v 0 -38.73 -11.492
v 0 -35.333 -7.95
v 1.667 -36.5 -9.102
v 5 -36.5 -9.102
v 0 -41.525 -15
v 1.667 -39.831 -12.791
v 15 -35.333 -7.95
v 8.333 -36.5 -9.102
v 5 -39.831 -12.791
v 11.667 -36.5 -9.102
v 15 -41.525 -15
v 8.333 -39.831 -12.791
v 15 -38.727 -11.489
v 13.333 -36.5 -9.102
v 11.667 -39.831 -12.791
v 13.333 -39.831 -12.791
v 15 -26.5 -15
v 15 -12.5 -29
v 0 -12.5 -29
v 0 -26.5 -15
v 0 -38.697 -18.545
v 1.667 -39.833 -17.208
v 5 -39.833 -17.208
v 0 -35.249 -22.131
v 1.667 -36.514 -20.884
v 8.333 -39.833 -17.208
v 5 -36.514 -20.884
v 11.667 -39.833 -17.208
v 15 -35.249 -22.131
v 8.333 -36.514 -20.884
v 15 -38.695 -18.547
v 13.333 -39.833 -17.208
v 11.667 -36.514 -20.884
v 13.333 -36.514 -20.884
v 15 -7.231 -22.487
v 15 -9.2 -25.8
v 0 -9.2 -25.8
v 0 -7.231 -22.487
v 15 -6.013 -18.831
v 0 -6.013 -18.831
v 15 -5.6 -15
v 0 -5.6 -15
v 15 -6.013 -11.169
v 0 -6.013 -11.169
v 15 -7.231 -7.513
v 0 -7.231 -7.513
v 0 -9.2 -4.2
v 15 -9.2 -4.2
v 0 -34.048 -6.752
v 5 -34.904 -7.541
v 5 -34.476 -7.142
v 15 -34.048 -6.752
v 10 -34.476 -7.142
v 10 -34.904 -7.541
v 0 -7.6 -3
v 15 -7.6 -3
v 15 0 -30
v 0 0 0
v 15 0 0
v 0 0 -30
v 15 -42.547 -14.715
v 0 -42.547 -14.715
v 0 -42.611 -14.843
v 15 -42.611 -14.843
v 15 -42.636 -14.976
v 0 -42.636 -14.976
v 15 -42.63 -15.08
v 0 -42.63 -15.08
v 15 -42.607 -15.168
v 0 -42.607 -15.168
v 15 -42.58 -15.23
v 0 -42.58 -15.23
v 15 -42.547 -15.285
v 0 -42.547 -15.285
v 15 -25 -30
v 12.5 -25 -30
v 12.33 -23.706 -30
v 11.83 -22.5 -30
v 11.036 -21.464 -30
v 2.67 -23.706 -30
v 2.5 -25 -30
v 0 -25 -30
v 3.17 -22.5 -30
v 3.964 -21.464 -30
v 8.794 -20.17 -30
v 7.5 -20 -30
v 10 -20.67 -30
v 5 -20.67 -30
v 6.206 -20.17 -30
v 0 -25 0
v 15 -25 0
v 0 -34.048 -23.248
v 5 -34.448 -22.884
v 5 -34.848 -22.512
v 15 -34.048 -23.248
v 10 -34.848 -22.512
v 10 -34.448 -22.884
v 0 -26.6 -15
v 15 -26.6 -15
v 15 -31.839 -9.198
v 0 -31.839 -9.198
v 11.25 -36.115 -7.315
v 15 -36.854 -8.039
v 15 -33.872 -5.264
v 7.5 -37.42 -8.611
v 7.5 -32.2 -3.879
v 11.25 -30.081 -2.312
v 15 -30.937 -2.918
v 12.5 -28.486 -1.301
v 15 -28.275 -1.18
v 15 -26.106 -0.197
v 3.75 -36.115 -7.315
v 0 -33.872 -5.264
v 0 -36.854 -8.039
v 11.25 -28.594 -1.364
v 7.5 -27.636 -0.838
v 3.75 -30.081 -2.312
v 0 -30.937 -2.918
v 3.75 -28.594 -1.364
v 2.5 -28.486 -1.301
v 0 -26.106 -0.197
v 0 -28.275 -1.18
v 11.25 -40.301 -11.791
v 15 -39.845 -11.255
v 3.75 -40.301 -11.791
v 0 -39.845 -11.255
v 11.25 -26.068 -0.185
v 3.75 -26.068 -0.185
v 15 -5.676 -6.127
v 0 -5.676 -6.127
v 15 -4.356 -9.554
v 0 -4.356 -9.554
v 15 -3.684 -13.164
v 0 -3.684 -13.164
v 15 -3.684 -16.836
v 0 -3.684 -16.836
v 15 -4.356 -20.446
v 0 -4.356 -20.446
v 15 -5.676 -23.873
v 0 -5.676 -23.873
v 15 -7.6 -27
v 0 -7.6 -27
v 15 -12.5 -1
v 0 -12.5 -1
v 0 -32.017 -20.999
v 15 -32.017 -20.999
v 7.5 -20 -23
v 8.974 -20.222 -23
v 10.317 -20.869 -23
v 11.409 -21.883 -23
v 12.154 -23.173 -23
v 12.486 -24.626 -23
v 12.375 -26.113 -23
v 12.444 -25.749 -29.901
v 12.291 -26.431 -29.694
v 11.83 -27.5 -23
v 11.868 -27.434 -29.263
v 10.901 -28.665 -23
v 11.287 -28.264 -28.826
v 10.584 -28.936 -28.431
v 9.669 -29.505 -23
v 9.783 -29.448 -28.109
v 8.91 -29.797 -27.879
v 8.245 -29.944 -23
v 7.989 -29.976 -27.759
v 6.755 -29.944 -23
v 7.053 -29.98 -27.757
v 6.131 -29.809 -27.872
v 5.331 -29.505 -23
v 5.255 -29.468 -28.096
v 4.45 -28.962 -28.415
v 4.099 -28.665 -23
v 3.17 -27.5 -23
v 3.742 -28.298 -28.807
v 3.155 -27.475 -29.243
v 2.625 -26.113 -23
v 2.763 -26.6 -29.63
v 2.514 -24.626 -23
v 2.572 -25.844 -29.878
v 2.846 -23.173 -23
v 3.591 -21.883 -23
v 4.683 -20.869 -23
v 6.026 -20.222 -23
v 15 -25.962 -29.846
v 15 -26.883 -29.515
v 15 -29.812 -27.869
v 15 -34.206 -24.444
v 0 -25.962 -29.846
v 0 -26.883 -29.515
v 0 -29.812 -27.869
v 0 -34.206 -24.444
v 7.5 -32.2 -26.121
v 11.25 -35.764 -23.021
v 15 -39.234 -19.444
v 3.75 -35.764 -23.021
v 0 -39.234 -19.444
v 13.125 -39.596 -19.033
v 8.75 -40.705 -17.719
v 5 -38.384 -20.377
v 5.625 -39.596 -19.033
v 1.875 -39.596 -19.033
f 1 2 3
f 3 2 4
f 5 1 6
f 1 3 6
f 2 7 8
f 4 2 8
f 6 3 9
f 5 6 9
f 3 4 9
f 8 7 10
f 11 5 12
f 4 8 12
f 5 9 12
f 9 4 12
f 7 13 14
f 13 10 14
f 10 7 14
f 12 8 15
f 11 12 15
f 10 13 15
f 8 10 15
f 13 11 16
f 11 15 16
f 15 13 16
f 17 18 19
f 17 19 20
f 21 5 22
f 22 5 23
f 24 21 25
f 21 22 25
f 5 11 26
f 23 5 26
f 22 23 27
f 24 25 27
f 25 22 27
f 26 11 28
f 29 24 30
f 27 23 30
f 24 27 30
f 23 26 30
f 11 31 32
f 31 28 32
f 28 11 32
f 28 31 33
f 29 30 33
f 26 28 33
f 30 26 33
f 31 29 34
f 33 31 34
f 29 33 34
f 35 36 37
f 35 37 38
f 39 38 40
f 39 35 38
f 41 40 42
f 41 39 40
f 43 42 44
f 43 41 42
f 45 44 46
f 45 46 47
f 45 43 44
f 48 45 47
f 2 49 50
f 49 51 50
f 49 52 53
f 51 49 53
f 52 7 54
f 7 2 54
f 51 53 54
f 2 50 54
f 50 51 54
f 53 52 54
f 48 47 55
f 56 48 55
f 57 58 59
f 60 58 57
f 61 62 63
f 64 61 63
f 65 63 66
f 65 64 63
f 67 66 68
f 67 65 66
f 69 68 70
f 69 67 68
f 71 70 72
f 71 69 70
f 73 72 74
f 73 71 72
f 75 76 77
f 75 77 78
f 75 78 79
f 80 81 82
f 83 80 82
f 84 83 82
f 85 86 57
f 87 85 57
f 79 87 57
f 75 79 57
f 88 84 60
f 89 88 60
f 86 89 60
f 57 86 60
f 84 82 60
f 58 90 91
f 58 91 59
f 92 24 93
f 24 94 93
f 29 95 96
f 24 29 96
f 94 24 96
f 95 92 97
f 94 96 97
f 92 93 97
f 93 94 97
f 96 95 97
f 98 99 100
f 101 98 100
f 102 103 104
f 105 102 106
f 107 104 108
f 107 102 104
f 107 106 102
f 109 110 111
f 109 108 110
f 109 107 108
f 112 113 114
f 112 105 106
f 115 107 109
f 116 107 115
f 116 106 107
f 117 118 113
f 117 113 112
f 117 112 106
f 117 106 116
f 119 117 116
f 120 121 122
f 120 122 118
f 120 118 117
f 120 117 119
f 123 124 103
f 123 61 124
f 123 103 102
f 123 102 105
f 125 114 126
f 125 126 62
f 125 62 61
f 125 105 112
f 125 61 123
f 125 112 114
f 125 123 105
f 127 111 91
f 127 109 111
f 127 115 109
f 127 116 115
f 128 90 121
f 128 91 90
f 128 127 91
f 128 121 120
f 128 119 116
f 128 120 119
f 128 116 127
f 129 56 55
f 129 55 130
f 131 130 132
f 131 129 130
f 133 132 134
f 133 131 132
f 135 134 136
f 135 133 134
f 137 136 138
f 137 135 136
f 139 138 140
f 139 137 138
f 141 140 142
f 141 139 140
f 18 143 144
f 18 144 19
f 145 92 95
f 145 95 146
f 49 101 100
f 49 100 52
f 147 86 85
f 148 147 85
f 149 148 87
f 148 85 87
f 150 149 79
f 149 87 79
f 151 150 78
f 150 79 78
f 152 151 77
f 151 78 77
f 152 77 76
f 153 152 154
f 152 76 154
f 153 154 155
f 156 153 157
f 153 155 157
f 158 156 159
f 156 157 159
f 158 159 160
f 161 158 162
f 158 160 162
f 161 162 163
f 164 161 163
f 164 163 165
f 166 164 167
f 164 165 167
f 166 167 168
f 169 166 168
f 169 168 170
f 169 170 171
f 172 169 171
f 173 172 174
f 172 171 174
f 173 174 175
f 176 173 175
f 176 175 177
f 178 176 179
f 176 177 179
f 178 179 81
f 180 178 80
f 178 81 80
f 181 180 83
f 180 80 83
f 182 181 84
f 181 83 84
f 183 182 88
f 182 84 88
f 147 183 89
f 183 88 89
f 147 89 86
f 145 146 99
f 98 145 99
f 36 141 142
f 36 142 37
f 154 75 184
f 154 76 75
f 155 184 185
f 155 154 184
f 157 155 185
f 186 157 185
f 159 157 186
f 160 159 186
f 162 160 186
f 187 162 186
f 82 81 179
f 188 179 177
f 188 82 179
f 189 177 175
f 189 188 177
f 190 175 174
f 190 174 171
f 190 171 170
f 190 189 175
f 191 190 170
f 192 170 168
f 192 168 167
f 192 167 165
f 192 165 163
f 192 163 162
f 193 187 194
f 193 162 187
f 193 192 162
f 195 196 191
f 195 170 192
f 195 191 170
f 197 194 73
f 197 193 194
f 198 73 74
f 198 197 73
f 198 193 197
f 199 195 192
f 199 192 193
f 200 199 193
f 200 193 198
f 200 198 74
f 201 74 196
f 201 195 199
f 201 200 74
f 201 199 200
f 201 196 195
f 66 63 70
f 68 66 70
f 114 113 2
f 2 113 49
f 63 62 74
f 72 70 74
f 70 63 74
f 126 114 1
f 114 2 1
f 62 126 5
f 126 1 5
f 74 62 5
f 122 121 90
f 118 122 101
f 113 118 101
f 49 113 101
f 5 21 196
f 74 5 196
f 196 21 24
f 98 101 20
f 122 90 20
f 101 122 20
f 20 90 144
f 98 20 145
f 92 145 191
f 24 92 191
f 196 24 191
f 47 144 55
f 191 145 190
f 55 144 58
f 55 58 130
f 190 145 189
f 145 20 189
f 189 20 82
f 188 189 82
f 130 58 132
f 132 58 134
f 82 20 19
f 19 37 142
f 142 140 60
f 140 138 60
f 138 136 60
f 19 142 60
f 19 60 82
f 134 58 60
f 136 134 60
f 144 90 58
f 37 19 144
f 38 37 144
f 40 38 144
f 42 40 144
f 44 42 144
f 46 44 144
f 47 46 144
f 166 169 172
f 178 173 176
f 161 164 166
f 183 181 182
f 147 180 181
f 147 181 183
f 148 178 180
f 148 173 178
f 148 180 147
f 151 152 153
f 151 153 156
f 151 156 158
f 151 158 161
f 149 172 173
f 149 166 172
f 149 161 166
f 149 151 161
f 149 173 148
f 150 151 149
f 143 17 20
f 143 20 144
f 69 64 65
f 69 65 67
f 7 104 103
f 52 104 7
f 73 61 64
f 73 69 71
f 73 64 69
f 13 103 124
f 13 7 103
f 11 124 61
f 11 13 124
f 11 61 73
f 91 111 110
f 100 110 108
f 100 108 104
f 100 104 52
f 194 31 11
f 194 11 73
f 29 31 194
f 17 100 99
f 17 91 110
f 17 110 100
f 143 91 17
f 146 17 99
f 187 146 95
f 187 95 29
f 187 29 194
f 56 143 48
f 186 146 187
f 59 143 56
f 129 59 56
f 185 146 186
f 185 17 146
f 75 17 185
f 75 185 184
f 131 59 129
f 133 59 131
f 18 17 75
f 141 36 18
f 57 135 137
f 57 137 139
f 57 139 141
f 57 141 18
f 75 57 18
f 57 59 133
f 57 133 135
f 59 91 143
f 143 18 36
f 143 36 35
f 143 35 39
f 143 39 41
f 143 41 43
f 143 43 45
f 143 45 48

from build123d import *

# Parameters (mm, degrees)
SKETCH3_W           = 30
SKETCH3_H           = 45
BOSS_EXTRUDE1_DEPTH = 15
FILLET1_SIZE        = 20
CUT_EXTRUDE3_DEPTH  = 55.331916325
CUT_EXTRUDE8_DEPTH  = 55.331916325
CUT_EXTRUDE9_DEPTH  = 55.331916325
SKETCH25_R          = 5
CUT_EXTRUDE11_DEPTH = 7
FILLET2_R           = 0.5


with BuildPart() as part:
    # Sketch3 → Boss-Extrude1 (new body)
    with BuildSketch(Plane(origin=(0, 0, 0), x_dir=(0, 0, -1), z_dir=(1, 0, 0))):
        with Locations((15, -22.5)):
            Rectangle(SKETCH3_W, SKETCH3_H)
    extrude(amount=BOSS_EXTRUDE1_DEPTH)

    # Fillet1
    # a fillet whose section is not a circle: 20 mm, written as the material it takes off along each edge
    with BuildSketch(Plane(origin=(-50, -45, -30), x_dir=(0, 1, 0), z_dir=(1, 0, 0)), Plane(origin=(-50, -45, 0), x_dir=(0, 0, -1), z_dir=(1, 0, 0))) as fillet1_piece_1:
        with BuildLine():
            Bezier((FILLET1_SIZE, 0), (0, 0), (0, FILLET1_SIZE), weights=[1, 0.23570226, 1])
            Line((0, FILLET1_SIZE), (0, 0))
            Line((0, 0), (FILLET1_SIZE, 0))
        make_face()
    extrude(amount=115, mode=Mode.SUBTRACT)

    # Sketch13 → Cut-Extrude3 (cut, through all)
    with BuildSketch(Plane(origin=(15, 0, 0), x_dir=(0, 0, -1), z_dir=(1, 0, 0))):
        Polygon((1, -12.5), (29, -12.5), (15, -26.5), align=None)
    extrude(amount=-CUT_EXTRUDE3_DEPTH, mode=Mode.SUBTRACT)

    # Sketch21 → Cut-Extrude8 (cut, through all)
    with BuildSketch(Plane(origin=(15, 0, 0), x_dir=(0, 0, -1), z_dir=(1, 0, 0))):
        with BuildLine():
            Line((20.999099472, -32.017092941), (15, -26.6))
            Line((15, -26.6), (9.197837651, -31.8392914))
            Line((9.197837651, -31.8392914), (6.751716779, -34.048112747))
            add(Edge.make_bspline(
                [(6.751716779, -34.048112747), (7.137670563, -34.475530569), (7.537017115, -34.903979725), (7.94976684, -35.333427086)],
                knots=[0.510805621, 0.510805621, 0.510805621, 0.510805621, 0.58717305, 0.58717305, 0.58717305, 0.58717305], degree=3))
            add(Edge.make_bspline(
                [(7.94976684, -35.333427086), (8.154213463, -35.546144521), (8.361948556, -35.759106865), (8.74730745, -36.148443801), (8.924817998, -36.325675997), (9.632110907, -37.023426184), (10.866534028, -38.197036851), (12.552696064, -39.658637771), (13.705600922, -40.565790559), (14.17200535, -40.917925916), (14.185722754, -40.928272256), (14.211686476, -40.947827457), (14.276533102, -40.99660607), (14.547571615, -41.199178962), (14.800672356, -41.38335147), (14.999893178, -41.525081651)],
                knots=[0.58717305, 0.58717305, 0.58717305, 0.58717305, 0.625, 0.625, 0.65625, 0.65625, 0.75, 0.875, 0.95703125, 0.95703125, 0.958984375, 0.958984375, 0.9609375, 0.96875, 1, 1, 1, 1], degree=3))
            add(Edge.make_bspline(
                [(14.999893178, -41.525081651), (15.199321685, -41.383202546), (15.452729149, -41.198806282), (15.737075559, -40.986289622), (15.815081437, -40.9275387), (15.85416041, -40.898031283), (15.864256494, -40.890397912), (16.318047278, -40.547025448), (17.4556848, -39.650959263), (19.12477944, -38.204529259), (20.355024133, -37.035590602), (21.060002804, -36.340635733), (21.237350271, -36.163716309), (21.656669951, -35.740378843), (21.89625213, -35.494384393), (22.131454088, -35.24870359)],
                knots=[0, 0, 0, 0, 0.03125, 0.0390625, 0.04296875, 0.04296875, 0.044921875, 0.044921875, 0.125, 0.25, 0.34375, 0.34375, 0.375, 0.375, 0.41847678, 0.41847678, 0.41847678, 0.41847678], degree=3))
            add(Edge.make_bspline(
                [(22.131454088, -35.24870359), (22.51540209, -34.847649728), (22.88767772, -34.447431671), (23.24828941, -34.048076256)],
                knots=[0.41847678, 0.41847678, 0.41847678, 0.41847678, 0.489449076, 0.489449076, 0.489449076, 0.489449076], degree=3))
            Line((23.24828941, -34.048076256), (20.999099472, -32.017092941))
        make_face()
    extrude(amount=-CUT_EXTRUDE8_DEPTH, mode=Mode.SUBTRACT)

    # Sketch23 → Cut-Extrude9 (cut, through all)
    with BuildSketch(Plane(origin=(15, 0, 0), x_dir=(0, 0, -1), z_dir=(1, 0, 0))):
        with BuildLine():
            Line((27, -7.6), (25.8, -9.2))
            ThreePointArc((25.8, -9.2), (15, -5.6), (4.2, -9.2))
            Line((4.2, -9.2), (3, -7.6))
            ThreePointArc((3, -7.6), (15, -3.6), (27, -7.6))
        make_face()
    extrude(amount=-CUT_EXTRUDE9_DEPTH, mode=Mode.SUBTRACT)

    # Sketch25 → Cut-Extrude11 (cut)
    with BuildSketch(Plane(origin=(0, 0, -30), x_dir=(-1, 0, 0), z_dir=(0, 0, -1))):
        with Locations(Location((-7.5, -25, 0), (0, 0, 90))):
            Circle(SKETCH25_R)
    extrude(amount=-CUT_EXTRUDE11_DEPTH, mode=Mode.SUBTRACT)

    # Fillet2
    fillet2_edges = [part.edges().sort_by_distance(p)[0] for p in [
        (7.5, -42.742918852, -15),
    ]]
    fillet(fillet2_edges, radius=FILLET2_R)


solid = part.part
